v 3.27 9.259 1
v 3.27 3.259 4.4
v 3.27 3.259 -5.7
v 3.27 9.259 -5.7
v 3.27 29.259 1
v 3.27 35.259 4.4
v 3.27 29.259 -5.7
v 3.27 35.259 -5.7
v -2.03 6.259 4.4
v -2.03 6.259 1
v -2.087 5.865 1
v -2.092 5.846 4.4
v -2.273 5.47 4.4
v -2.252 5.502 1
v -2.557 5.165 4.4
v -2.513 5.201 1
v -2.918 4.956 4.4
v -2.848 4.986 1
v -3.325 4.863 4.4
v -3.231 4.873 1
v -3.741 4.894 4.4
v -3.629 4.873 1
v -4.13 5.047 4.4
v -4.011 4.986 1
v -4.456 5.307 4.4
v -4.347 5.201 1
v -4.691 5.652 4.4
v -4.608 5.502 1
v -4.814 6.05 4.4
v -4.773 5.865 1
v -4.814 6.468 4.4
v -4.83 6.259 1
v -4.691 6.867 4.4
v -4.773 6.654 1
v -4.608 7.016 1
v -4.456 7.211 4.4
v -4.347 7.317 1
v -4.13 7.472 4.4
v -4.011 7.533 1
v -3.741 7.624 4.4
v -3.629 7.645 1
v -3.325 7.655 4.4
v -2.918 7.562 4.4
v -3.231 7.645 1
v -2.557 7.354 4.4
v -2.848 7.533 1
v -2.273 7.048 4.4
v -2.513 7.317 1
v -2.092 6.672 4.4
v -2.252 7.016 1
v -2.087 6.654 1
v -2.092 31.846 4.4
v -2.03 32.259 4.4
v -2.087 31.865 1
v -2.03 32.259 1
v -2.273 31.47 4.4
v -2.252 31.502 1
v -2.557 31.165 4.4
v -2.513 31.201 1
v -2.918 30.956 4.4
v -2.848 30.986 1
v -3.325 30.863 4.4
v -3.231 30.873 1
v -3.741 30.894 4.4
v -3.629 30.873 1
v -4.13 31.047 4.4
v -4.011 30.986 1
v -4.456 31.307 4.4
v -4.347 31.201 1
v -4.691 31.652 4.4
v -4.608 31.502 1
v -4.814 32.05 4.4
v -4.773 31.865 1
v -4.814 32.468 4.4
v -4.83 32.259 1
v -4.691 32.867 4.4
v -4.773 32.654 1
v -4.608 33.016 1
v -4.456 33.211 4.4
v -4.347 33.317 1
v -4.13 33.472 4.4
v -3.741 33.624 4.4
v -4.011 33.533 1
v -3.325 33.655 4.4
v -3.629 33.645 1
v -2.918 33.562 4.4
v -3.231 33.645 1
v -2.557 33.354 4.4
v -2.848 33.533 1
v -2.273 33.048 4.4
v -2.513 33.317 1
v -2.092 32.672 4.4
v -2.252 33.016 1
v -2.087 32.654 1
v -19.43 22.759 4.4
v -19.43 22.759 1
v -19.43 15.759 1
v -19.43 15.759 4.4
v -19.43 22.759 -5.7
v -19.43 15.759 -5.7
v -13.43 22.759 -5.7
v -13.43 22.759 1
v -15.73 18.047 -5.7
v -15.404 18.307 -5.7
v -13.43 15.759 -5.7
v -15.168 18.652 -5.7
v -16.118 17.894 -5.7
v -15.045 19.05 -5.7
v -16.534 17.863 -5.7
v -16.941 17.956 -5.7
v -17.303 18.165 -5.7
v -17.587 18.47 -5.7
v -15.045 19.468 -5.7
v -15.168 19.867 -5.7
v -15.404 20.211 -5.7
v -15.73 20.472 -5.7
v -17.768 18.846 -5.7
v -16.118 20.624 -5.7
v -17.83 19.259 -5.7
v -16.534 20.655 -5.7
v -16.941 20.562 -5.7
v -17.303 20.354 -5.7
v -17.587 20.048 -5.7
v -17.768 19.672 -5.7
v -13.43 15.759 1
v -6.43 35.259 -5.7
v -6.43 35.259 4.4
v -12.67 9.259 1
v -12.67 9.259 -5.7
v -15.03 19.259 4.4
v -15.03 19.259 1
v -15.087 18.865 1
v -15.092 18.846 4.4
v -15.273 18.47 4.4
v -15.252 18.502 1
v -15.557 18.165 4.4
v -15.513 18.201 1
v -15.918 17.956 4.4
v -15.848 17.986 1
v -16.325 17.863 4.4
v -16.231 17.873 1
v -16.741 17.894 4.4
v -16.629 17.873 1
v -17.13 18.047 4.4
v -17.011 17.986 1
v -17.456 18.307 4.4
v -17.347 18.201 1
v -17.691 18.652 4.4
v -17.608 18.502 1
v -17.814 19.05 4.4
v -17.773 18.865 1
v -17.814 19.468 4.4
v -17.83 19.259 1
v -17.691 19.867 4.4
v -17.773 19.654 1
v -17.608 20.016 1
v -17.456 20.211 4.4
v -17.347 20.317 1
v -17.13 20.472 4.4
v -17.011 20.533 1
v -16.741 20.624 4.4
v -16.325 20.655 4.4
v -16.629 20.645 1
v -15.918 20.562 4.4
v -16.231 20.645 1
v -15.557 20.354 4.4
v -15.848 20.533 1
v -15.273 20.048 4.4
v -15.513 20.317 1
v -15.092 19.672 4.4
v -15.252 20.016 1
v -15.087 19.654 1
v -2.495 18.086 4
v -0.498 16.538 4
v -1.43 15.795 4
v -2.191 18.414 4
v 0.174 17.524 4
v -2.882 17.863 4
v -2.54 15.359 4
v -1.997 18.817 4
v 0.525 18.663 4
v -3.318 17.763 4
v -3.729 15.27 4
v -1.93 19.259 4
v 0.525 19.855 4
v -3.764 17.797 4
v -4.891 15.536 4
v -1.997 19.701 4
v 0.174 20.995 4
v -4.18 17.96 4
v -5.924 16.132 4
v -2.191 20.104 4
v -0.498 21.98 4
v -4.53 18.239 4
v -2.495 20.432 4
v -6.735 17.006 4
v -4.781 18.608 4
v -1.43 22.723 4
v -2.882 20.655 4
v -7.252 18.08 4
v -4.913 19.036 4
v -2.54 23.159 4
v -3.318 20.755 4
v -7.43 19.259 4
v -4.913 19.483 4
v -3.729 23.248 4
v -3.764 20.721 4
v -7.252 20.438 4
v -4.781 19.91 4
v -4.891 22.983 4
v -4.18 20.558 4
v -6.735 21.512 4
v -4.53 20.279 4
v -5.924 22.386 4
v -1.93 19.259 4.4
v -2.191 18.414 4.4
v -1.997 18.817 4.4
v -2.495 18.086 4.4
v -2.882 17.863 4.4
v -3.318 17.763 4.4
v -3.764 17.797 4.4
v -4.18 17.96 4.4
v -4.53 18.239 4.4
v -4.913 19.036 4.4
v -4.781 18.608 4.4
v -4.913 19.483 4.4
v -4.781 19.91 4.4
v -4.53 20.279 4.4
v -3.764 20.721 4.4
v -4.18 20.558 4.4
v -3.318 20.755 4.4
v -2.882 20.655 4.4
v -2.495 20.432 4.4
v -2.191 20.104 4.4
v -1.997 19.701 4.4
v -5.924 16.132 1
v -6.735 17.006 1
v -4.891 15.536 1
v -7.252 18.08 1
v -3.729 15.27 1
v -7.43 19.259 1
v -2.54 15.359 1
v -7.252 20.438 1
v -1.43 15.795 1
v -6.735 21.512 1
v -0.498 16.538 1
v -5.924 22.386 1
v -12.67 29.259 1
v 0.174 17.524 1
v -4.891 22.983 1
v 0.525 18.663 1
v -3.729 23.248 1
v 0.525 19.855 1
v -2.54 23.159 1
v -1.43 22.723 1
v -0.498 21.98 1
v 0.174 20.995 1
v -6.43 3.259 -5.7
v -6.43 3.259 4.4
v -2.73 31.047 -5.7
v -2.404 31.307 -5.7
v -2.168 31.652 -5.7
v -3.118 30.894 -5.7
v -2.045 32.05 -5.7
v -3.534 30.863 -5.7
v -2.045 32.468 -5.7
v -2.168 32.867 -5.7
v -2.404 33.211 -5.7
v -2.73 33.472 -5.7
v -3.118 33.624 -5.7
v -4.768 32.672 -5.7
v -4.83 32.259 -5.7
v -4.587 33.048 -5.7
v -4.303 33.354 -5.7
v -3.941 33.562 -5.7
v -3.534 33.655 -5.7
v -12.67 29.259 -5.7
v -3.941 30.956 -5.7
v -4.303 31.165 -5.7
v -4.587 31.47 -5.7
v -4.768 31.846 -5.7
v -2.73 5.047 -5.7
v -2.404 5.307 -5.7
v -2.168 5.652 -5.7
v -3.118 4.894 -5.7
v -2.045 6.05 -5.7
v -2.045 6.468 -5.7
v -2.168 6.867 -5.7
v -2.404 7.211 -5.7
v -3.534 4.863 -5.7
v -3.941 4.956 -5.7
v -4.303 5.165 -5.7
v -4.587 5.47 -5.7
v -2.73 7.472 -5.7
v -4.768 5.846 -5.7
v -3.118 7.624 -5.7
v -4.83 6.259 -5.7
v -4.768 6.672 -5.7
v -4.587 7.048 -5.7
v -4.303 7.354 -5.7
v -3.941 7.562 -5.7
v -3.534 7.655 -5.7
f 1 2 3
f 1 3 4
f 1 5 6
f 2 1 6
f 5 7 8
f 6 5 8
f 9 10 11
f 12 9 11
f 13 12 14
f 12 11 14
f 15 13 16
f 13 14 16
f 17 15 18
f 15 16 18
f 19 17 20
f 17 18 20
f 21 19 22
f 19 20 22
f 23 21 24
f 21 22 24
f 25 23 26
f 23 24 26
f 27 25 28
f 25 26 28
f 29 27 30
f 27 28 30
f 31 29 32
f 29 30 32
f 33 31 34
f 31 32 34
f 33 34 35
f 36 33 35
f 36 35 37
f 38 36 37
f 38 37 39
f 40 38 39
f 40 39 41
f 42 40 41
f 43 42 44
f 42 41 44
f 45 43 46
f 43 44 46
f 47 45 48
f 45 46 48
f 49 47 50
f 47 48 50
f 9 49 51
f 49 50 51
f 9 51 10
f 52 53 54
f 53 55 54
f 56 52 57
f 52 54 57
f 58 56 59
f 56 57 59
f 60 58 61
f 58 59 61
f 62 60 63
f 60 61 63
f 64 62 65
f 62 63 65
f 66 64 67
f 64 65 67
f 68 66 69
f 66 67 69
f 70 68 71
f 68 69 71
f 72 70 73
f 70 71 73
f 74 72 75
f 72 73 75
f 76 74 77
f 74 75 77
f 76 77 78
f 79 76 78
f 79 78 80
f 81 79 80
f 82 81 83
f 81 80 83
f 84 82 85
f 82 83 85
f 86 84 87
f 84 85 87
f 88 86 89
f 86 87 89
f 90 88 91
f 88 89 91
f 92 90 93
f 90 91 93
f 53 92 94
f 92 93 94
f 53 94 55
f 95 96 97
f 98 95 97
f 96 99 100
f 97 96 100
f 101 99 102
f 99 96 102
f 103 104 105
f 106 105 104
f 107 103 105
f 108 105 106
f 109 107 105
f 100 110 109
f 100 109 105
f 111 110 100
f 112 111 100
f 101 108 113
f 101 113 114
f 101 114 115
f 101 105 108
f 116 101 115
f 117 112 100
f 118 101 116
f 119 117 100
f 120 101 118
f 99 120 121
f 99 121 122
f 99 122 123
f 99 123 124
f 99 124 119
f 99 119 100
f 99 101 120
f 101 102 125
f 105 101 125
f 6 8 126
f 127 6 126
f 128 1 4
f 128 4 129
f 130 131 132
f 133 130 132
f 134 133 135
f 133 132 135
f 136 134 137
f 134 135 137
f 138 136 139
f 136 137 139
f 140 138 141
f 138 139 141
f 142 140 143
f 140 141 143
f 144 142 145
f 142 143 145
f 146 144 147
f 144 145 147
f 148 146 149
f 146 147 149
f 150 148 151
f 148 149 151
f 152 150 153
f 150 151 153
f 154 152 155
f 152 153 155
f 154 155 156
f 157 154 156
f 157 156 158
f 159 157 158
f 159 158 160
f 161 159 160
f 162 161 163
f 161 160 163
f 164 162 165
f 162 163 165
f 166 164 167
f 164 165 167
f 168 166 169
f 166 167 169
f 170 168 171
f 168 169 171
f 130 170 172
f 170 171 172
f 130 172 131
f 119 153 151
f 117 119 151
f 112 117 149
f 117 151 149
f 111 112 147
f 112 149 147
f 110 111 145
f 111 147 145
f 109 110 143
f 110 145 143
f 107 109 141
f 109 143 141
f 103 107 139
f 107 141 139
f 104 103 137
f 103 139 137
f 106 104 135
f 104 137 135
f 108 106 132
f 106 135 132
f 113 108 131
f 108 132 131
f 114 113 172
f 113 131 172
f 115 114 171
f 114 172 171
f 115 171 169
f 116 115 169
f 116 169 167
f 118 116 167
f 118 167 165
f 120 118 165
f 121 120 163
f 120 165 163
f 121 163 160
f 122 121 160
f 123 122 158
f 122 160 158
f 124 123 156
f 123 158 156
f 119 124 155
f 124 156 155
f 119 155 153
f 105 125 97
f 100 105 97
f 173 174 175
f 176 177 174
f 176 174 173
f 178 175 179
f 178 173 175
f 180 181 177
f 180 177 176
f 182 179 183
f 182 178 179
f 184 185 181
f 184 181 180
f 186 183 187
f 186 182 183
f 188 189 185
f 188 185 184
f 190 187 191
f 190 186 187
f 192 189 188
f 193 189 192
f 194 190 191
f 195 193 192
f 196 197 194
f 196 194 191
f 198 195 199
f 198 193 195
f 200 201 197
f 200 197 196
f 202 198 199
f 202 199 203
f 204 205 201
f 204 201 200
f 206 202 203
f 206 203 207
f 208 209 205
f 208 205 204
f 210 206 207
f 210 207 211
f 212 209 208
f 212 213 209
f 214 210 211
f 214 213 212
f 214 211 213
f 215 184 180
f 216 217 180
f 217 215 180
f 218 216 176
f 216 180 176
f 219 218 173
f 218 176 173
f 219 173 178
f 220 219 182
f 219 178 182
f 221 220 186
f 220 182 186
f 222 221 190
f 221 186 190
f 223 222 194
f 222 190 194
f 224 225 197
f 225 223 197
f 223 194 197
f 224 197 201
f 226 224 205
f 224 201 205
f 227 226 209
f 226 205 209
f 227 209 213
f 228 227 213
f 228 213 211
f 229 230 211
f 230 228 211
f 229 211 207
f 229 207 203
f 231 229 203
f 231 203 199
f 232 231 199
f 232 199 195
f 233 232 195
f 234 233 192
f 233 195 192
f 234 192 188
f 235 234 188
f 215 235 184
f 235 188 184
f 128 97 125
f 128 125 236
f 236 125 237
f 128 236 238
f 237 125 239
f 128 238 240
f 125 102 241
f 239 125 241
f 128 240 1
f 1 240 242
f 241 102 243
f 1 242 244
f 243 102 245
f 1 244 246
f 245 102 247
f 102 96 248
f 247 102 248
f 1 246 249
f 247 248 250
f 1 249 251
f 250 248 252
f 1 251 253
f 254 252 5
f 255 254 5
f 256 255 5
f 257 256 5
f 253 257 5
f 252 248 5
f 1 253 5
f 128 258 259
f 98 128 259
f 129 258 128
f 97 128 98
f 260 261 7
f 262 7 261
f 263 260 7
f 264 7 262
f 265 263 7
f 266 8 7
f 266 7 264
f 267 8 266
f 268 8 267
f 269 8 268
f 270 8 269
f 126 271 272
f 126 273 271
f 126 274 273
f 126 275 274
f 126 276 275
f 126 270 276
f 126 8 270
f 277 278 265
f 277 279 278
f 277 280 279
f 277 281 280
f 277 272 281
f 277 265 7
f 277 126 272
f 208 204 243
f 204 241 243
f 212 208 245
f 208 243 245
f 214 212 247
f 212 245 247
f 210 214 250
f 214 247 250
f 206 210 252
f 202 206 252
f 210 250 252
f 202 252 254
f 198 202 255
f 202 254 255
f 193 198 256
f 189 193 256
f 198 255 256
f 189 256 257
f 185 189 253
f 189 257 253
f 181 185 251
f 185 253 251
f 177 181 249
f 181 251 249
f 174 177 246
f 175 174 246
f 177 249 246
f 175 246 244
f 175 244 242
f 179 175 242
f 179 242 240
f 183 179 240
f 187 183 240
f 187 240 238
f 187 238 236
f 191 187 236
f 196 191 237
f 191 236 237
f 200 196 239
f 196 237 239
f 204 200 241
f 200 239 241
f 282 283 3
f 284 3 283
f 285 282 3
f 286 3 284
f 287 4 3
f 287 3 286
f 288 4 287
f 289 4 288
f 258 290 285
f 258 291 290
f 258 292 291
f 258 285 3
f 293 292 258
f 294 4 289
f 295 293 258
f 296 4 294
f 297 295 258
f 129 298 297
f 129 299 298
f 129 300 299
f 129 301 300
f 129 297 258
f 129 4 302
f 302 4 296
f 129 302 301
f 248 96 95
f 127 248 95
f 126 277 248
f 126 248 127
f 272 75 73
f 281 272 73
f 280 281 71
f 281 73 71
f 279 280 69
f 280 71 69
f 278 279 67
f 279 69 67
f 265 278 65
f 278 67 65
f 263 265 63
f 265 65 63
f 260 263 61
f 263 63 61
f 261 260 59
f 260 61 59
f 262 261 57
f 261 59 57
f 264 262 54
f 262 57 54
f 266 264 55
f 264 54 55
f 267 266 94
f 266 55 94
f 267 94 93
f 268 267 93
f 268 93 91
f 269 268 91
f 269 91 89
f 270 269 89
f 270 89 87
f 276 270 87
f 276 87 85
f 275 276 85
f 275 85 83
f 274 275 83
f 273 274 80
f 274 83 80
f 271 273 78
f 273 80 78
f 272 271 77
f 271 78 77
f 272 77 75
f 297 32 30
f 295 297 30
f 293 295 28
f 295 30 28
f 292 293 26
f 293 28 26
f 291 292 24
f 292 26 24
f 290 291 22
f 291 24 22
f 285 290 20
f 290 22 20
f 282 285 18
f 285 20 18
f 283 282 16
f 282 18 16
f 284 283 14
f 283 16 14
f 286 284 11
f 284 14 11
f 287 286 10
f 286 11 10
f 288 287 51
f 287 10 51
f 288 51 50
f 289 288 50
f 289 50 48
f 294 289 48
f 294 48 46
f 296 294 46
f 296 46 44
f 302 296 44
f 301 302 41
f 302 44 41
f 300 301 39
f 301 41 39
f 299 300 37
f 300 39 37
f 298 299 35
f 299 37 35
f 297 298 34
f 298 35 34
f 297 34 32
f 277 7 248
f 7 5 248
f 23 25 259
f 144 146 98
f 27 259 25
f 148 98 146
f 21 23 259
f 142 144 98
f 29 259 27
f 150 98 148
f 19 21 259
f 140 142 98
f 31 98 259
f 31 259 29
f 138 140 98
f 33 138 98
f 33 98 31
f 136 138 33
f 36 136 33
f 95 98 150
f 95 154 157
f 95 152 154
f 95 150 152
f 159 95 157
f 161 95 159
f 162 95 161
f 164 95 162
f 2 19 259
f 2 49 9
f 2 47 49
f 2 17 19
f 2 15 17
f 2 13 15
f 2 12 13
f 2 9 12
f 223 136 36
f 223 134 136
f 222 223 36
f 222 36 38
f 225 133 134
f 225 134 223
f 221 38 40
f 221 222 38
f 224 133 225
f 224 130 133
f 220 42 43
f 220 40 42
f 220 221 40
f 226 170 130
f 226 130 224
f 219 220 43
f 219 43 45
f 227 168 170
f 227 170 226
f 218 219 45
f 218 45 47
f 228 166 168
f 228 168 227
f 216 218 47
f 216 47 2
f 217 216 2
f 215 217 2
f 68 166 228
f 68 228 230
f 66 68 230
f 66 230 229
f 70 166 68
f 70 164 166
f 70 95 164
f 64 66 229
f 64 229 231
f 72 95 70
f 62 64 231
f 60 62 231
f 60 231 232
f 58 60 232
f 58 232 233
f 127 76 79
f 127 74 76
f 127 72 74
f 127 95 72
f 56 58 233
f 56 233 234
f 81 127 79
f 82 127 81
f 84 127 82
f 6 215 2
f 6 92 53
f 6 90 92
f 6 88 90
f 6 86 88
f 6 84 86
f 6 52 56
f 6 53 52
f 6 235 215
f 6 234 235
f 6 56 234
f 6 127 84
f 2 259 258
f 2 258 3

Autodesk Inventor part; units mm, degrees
ref_plane "YZ Plane" through (0, 0, 0) normal (1, 0, 0) x (0, 1, 0)
ref_plane "XZ Plane" through (0, 0, 0) normal (0, 1, 0) x (-1, 0, 0)
ref_plane "Arbeitsebene1" through (0, 0, 1) normal (0, 0, 1) x (1, 0, 0)
sketch "Skizze1" plane through (0, 0, 1) normal (0, 0, 1) x (1, 0, 0)
  circle A0 centre (-16.4298, 19.2591) radius 1.4 projected
  circle A1 centre (-3.4298, 6.2591) radius 1.4 projected
  circle A2 centre (-3.4298, 32.2591) radius 1.4 projected
  circle A3 centre (-3.43, 19.2591) radius 2.45 construction
  line L0 (-0.43, 35.2591) -> (-6.43, 35.2591)
  line L1 (-6.43, 35.2591) -> (-6.43, 3.2591)
  line L2 (-6.43, 3.2591) -> (-0.43, 3.2591)
  line L3 (-0.43, 3.2591) -> (-0.43, 35.2591)
  line L4 (-0.43, 35.2591) -> (-6.43, 3.2591) construction
  line L5 (-6.43, 35.2591) -> (-0.43, 3.2591) construction
  line L6 (-6.43, 22.7591) -> (-19.43, 22.7591)
  line L7 (-19.43, 22.7591) -> (-19.43, 15.7591)
  line L8 (-19.43, 15.7591) -> (-6.43, 15.7591)
  line L9 (-6.43, 15.7591) -> (-6.43, 22.7591)
  line L10 (-6.43, 22.7591) -> (-19.43, 15.7591) construction
  line L11 (-19.43, 22.7591) -> (-6.43, 15.7591) construction
  line L12 (-6.43, 3.2591) -> (-19.43, 15.7591)
  line L13 (-19.43, 22.7591) -> (-6.43, 35.2591)
  line L14 (-0.43, 3.2591) -> (3.27, 3.2591)
  line L15 (3.27, 3.2591) -> (3.27, 35.2591)
  line L16 (3.27, 35.2591) -> (-0.43, 35.2591)
  line L17 (-0.43, 35.2591) -> (-0.43, 3.2591)
  circle A4 centre (-3.43, 19.2591) radius 1.5
  point P0 (0, 0)
  point P1 (-12.93, 19.2591)
  point P2 (-6.43, 19.2591)
  dimension "d1" = 6
  dimension "d2" = 32
  dimension "d3" = 7
  dimension "d4" = 13
  dimension "d12" = 3.7
  dimension "d18" = 3
extrude "Extrusion1" add sketch "Skizze1" along normal blind 3.4
sketch "Skizze2" plane through (0, 0, 1) normal (0, 0, -1) x (-1, 0, 0)
  circle A0 centre (3.4298, 32.2591) radius 1.4 projected
  line L0 (16.86, 34.56) -> (16.86, 4.56) projected
  circle A1 centre (16.4298, 19.2591) radius 1.4 projected
  circle A2 centre (3.4298, 6.2591) radius 1.4 projected
  line L1 (6.43, 35.2591) -> (19.43, 22.7591) projected
  line L2 (19.43, 22.7591) -> (19.43, 15.7591) projected
  line L3 (19.43, 15.7591) -> (6.43, 3.2591) projected
  circle A3 centre (16.4298, 19.2591) radius 1.4 projected
  circle A4 centre (3.4298, 6.2591) radius 1.4 projected
  circle A5 centre (3.4298, 32.2591) radius 1.4 projected
  line L4 (-3.27, 29.2591) -> (12.67, 29.2591)
  line L5 (6.43, 35.2591) -> (19.43, 22.7591) projected
  line L6 (19.43, 22.7591) -> (19.43, 15.7591) projected
  line L7 (19.43, 22.7591) -> (13.43, 22.7591)
  line L8 (13.43, 22.7591) -> (13.43, 15.7591)
  line L9 (13.43, 15.7591) -> (19.43, 15.7591)
  line L10 (-3.27, 9.2591) -> (12.67, 9.2591)
  line L11 (19.43, 15.7591) -> (6.43, 3.2591) projected
  line L12 (6.43, 3.2591) -> (-3.27, 3.2591) projected
  line L13 (-3.27, 3.2591) -> (-3.27, 35.2591) projected
  line L14 (-3.27, 35.2591) -> (6.43, 35.2591) projected
  point P0 (0, 0)
  point P1 (12.67, 29.2591)
  dimension "d8" = 6
  dimension "d13" = 6
  dimension "d14" = 6
extrude "Extrusion2" add sketch "Skizze2" along normal blind 6.7 contours L7 L2 L9 L0 A1 | L0 A1 L9 L8 L7 | L4 L13 L14 L1 | L10 L3 L12 L13
sketch "Skizze4" plane through (0, 0, 1) normal (0, 0, -1) x (-1, 0, 0)
  circle A0 centre (3.43, 19.2591) radius 1.5 projected
  circle A1 centre (3.43, 19.2591) radius 4
  point P0 (0, 0)
  dimension "d19" = 8
extrude "Extrusion4" cut sketch "Skizze4" against normal blind 3
properties part number "Assembly_Cube_Z_Focus_MGN_NEMA_belt_pushing_cage_v3"
